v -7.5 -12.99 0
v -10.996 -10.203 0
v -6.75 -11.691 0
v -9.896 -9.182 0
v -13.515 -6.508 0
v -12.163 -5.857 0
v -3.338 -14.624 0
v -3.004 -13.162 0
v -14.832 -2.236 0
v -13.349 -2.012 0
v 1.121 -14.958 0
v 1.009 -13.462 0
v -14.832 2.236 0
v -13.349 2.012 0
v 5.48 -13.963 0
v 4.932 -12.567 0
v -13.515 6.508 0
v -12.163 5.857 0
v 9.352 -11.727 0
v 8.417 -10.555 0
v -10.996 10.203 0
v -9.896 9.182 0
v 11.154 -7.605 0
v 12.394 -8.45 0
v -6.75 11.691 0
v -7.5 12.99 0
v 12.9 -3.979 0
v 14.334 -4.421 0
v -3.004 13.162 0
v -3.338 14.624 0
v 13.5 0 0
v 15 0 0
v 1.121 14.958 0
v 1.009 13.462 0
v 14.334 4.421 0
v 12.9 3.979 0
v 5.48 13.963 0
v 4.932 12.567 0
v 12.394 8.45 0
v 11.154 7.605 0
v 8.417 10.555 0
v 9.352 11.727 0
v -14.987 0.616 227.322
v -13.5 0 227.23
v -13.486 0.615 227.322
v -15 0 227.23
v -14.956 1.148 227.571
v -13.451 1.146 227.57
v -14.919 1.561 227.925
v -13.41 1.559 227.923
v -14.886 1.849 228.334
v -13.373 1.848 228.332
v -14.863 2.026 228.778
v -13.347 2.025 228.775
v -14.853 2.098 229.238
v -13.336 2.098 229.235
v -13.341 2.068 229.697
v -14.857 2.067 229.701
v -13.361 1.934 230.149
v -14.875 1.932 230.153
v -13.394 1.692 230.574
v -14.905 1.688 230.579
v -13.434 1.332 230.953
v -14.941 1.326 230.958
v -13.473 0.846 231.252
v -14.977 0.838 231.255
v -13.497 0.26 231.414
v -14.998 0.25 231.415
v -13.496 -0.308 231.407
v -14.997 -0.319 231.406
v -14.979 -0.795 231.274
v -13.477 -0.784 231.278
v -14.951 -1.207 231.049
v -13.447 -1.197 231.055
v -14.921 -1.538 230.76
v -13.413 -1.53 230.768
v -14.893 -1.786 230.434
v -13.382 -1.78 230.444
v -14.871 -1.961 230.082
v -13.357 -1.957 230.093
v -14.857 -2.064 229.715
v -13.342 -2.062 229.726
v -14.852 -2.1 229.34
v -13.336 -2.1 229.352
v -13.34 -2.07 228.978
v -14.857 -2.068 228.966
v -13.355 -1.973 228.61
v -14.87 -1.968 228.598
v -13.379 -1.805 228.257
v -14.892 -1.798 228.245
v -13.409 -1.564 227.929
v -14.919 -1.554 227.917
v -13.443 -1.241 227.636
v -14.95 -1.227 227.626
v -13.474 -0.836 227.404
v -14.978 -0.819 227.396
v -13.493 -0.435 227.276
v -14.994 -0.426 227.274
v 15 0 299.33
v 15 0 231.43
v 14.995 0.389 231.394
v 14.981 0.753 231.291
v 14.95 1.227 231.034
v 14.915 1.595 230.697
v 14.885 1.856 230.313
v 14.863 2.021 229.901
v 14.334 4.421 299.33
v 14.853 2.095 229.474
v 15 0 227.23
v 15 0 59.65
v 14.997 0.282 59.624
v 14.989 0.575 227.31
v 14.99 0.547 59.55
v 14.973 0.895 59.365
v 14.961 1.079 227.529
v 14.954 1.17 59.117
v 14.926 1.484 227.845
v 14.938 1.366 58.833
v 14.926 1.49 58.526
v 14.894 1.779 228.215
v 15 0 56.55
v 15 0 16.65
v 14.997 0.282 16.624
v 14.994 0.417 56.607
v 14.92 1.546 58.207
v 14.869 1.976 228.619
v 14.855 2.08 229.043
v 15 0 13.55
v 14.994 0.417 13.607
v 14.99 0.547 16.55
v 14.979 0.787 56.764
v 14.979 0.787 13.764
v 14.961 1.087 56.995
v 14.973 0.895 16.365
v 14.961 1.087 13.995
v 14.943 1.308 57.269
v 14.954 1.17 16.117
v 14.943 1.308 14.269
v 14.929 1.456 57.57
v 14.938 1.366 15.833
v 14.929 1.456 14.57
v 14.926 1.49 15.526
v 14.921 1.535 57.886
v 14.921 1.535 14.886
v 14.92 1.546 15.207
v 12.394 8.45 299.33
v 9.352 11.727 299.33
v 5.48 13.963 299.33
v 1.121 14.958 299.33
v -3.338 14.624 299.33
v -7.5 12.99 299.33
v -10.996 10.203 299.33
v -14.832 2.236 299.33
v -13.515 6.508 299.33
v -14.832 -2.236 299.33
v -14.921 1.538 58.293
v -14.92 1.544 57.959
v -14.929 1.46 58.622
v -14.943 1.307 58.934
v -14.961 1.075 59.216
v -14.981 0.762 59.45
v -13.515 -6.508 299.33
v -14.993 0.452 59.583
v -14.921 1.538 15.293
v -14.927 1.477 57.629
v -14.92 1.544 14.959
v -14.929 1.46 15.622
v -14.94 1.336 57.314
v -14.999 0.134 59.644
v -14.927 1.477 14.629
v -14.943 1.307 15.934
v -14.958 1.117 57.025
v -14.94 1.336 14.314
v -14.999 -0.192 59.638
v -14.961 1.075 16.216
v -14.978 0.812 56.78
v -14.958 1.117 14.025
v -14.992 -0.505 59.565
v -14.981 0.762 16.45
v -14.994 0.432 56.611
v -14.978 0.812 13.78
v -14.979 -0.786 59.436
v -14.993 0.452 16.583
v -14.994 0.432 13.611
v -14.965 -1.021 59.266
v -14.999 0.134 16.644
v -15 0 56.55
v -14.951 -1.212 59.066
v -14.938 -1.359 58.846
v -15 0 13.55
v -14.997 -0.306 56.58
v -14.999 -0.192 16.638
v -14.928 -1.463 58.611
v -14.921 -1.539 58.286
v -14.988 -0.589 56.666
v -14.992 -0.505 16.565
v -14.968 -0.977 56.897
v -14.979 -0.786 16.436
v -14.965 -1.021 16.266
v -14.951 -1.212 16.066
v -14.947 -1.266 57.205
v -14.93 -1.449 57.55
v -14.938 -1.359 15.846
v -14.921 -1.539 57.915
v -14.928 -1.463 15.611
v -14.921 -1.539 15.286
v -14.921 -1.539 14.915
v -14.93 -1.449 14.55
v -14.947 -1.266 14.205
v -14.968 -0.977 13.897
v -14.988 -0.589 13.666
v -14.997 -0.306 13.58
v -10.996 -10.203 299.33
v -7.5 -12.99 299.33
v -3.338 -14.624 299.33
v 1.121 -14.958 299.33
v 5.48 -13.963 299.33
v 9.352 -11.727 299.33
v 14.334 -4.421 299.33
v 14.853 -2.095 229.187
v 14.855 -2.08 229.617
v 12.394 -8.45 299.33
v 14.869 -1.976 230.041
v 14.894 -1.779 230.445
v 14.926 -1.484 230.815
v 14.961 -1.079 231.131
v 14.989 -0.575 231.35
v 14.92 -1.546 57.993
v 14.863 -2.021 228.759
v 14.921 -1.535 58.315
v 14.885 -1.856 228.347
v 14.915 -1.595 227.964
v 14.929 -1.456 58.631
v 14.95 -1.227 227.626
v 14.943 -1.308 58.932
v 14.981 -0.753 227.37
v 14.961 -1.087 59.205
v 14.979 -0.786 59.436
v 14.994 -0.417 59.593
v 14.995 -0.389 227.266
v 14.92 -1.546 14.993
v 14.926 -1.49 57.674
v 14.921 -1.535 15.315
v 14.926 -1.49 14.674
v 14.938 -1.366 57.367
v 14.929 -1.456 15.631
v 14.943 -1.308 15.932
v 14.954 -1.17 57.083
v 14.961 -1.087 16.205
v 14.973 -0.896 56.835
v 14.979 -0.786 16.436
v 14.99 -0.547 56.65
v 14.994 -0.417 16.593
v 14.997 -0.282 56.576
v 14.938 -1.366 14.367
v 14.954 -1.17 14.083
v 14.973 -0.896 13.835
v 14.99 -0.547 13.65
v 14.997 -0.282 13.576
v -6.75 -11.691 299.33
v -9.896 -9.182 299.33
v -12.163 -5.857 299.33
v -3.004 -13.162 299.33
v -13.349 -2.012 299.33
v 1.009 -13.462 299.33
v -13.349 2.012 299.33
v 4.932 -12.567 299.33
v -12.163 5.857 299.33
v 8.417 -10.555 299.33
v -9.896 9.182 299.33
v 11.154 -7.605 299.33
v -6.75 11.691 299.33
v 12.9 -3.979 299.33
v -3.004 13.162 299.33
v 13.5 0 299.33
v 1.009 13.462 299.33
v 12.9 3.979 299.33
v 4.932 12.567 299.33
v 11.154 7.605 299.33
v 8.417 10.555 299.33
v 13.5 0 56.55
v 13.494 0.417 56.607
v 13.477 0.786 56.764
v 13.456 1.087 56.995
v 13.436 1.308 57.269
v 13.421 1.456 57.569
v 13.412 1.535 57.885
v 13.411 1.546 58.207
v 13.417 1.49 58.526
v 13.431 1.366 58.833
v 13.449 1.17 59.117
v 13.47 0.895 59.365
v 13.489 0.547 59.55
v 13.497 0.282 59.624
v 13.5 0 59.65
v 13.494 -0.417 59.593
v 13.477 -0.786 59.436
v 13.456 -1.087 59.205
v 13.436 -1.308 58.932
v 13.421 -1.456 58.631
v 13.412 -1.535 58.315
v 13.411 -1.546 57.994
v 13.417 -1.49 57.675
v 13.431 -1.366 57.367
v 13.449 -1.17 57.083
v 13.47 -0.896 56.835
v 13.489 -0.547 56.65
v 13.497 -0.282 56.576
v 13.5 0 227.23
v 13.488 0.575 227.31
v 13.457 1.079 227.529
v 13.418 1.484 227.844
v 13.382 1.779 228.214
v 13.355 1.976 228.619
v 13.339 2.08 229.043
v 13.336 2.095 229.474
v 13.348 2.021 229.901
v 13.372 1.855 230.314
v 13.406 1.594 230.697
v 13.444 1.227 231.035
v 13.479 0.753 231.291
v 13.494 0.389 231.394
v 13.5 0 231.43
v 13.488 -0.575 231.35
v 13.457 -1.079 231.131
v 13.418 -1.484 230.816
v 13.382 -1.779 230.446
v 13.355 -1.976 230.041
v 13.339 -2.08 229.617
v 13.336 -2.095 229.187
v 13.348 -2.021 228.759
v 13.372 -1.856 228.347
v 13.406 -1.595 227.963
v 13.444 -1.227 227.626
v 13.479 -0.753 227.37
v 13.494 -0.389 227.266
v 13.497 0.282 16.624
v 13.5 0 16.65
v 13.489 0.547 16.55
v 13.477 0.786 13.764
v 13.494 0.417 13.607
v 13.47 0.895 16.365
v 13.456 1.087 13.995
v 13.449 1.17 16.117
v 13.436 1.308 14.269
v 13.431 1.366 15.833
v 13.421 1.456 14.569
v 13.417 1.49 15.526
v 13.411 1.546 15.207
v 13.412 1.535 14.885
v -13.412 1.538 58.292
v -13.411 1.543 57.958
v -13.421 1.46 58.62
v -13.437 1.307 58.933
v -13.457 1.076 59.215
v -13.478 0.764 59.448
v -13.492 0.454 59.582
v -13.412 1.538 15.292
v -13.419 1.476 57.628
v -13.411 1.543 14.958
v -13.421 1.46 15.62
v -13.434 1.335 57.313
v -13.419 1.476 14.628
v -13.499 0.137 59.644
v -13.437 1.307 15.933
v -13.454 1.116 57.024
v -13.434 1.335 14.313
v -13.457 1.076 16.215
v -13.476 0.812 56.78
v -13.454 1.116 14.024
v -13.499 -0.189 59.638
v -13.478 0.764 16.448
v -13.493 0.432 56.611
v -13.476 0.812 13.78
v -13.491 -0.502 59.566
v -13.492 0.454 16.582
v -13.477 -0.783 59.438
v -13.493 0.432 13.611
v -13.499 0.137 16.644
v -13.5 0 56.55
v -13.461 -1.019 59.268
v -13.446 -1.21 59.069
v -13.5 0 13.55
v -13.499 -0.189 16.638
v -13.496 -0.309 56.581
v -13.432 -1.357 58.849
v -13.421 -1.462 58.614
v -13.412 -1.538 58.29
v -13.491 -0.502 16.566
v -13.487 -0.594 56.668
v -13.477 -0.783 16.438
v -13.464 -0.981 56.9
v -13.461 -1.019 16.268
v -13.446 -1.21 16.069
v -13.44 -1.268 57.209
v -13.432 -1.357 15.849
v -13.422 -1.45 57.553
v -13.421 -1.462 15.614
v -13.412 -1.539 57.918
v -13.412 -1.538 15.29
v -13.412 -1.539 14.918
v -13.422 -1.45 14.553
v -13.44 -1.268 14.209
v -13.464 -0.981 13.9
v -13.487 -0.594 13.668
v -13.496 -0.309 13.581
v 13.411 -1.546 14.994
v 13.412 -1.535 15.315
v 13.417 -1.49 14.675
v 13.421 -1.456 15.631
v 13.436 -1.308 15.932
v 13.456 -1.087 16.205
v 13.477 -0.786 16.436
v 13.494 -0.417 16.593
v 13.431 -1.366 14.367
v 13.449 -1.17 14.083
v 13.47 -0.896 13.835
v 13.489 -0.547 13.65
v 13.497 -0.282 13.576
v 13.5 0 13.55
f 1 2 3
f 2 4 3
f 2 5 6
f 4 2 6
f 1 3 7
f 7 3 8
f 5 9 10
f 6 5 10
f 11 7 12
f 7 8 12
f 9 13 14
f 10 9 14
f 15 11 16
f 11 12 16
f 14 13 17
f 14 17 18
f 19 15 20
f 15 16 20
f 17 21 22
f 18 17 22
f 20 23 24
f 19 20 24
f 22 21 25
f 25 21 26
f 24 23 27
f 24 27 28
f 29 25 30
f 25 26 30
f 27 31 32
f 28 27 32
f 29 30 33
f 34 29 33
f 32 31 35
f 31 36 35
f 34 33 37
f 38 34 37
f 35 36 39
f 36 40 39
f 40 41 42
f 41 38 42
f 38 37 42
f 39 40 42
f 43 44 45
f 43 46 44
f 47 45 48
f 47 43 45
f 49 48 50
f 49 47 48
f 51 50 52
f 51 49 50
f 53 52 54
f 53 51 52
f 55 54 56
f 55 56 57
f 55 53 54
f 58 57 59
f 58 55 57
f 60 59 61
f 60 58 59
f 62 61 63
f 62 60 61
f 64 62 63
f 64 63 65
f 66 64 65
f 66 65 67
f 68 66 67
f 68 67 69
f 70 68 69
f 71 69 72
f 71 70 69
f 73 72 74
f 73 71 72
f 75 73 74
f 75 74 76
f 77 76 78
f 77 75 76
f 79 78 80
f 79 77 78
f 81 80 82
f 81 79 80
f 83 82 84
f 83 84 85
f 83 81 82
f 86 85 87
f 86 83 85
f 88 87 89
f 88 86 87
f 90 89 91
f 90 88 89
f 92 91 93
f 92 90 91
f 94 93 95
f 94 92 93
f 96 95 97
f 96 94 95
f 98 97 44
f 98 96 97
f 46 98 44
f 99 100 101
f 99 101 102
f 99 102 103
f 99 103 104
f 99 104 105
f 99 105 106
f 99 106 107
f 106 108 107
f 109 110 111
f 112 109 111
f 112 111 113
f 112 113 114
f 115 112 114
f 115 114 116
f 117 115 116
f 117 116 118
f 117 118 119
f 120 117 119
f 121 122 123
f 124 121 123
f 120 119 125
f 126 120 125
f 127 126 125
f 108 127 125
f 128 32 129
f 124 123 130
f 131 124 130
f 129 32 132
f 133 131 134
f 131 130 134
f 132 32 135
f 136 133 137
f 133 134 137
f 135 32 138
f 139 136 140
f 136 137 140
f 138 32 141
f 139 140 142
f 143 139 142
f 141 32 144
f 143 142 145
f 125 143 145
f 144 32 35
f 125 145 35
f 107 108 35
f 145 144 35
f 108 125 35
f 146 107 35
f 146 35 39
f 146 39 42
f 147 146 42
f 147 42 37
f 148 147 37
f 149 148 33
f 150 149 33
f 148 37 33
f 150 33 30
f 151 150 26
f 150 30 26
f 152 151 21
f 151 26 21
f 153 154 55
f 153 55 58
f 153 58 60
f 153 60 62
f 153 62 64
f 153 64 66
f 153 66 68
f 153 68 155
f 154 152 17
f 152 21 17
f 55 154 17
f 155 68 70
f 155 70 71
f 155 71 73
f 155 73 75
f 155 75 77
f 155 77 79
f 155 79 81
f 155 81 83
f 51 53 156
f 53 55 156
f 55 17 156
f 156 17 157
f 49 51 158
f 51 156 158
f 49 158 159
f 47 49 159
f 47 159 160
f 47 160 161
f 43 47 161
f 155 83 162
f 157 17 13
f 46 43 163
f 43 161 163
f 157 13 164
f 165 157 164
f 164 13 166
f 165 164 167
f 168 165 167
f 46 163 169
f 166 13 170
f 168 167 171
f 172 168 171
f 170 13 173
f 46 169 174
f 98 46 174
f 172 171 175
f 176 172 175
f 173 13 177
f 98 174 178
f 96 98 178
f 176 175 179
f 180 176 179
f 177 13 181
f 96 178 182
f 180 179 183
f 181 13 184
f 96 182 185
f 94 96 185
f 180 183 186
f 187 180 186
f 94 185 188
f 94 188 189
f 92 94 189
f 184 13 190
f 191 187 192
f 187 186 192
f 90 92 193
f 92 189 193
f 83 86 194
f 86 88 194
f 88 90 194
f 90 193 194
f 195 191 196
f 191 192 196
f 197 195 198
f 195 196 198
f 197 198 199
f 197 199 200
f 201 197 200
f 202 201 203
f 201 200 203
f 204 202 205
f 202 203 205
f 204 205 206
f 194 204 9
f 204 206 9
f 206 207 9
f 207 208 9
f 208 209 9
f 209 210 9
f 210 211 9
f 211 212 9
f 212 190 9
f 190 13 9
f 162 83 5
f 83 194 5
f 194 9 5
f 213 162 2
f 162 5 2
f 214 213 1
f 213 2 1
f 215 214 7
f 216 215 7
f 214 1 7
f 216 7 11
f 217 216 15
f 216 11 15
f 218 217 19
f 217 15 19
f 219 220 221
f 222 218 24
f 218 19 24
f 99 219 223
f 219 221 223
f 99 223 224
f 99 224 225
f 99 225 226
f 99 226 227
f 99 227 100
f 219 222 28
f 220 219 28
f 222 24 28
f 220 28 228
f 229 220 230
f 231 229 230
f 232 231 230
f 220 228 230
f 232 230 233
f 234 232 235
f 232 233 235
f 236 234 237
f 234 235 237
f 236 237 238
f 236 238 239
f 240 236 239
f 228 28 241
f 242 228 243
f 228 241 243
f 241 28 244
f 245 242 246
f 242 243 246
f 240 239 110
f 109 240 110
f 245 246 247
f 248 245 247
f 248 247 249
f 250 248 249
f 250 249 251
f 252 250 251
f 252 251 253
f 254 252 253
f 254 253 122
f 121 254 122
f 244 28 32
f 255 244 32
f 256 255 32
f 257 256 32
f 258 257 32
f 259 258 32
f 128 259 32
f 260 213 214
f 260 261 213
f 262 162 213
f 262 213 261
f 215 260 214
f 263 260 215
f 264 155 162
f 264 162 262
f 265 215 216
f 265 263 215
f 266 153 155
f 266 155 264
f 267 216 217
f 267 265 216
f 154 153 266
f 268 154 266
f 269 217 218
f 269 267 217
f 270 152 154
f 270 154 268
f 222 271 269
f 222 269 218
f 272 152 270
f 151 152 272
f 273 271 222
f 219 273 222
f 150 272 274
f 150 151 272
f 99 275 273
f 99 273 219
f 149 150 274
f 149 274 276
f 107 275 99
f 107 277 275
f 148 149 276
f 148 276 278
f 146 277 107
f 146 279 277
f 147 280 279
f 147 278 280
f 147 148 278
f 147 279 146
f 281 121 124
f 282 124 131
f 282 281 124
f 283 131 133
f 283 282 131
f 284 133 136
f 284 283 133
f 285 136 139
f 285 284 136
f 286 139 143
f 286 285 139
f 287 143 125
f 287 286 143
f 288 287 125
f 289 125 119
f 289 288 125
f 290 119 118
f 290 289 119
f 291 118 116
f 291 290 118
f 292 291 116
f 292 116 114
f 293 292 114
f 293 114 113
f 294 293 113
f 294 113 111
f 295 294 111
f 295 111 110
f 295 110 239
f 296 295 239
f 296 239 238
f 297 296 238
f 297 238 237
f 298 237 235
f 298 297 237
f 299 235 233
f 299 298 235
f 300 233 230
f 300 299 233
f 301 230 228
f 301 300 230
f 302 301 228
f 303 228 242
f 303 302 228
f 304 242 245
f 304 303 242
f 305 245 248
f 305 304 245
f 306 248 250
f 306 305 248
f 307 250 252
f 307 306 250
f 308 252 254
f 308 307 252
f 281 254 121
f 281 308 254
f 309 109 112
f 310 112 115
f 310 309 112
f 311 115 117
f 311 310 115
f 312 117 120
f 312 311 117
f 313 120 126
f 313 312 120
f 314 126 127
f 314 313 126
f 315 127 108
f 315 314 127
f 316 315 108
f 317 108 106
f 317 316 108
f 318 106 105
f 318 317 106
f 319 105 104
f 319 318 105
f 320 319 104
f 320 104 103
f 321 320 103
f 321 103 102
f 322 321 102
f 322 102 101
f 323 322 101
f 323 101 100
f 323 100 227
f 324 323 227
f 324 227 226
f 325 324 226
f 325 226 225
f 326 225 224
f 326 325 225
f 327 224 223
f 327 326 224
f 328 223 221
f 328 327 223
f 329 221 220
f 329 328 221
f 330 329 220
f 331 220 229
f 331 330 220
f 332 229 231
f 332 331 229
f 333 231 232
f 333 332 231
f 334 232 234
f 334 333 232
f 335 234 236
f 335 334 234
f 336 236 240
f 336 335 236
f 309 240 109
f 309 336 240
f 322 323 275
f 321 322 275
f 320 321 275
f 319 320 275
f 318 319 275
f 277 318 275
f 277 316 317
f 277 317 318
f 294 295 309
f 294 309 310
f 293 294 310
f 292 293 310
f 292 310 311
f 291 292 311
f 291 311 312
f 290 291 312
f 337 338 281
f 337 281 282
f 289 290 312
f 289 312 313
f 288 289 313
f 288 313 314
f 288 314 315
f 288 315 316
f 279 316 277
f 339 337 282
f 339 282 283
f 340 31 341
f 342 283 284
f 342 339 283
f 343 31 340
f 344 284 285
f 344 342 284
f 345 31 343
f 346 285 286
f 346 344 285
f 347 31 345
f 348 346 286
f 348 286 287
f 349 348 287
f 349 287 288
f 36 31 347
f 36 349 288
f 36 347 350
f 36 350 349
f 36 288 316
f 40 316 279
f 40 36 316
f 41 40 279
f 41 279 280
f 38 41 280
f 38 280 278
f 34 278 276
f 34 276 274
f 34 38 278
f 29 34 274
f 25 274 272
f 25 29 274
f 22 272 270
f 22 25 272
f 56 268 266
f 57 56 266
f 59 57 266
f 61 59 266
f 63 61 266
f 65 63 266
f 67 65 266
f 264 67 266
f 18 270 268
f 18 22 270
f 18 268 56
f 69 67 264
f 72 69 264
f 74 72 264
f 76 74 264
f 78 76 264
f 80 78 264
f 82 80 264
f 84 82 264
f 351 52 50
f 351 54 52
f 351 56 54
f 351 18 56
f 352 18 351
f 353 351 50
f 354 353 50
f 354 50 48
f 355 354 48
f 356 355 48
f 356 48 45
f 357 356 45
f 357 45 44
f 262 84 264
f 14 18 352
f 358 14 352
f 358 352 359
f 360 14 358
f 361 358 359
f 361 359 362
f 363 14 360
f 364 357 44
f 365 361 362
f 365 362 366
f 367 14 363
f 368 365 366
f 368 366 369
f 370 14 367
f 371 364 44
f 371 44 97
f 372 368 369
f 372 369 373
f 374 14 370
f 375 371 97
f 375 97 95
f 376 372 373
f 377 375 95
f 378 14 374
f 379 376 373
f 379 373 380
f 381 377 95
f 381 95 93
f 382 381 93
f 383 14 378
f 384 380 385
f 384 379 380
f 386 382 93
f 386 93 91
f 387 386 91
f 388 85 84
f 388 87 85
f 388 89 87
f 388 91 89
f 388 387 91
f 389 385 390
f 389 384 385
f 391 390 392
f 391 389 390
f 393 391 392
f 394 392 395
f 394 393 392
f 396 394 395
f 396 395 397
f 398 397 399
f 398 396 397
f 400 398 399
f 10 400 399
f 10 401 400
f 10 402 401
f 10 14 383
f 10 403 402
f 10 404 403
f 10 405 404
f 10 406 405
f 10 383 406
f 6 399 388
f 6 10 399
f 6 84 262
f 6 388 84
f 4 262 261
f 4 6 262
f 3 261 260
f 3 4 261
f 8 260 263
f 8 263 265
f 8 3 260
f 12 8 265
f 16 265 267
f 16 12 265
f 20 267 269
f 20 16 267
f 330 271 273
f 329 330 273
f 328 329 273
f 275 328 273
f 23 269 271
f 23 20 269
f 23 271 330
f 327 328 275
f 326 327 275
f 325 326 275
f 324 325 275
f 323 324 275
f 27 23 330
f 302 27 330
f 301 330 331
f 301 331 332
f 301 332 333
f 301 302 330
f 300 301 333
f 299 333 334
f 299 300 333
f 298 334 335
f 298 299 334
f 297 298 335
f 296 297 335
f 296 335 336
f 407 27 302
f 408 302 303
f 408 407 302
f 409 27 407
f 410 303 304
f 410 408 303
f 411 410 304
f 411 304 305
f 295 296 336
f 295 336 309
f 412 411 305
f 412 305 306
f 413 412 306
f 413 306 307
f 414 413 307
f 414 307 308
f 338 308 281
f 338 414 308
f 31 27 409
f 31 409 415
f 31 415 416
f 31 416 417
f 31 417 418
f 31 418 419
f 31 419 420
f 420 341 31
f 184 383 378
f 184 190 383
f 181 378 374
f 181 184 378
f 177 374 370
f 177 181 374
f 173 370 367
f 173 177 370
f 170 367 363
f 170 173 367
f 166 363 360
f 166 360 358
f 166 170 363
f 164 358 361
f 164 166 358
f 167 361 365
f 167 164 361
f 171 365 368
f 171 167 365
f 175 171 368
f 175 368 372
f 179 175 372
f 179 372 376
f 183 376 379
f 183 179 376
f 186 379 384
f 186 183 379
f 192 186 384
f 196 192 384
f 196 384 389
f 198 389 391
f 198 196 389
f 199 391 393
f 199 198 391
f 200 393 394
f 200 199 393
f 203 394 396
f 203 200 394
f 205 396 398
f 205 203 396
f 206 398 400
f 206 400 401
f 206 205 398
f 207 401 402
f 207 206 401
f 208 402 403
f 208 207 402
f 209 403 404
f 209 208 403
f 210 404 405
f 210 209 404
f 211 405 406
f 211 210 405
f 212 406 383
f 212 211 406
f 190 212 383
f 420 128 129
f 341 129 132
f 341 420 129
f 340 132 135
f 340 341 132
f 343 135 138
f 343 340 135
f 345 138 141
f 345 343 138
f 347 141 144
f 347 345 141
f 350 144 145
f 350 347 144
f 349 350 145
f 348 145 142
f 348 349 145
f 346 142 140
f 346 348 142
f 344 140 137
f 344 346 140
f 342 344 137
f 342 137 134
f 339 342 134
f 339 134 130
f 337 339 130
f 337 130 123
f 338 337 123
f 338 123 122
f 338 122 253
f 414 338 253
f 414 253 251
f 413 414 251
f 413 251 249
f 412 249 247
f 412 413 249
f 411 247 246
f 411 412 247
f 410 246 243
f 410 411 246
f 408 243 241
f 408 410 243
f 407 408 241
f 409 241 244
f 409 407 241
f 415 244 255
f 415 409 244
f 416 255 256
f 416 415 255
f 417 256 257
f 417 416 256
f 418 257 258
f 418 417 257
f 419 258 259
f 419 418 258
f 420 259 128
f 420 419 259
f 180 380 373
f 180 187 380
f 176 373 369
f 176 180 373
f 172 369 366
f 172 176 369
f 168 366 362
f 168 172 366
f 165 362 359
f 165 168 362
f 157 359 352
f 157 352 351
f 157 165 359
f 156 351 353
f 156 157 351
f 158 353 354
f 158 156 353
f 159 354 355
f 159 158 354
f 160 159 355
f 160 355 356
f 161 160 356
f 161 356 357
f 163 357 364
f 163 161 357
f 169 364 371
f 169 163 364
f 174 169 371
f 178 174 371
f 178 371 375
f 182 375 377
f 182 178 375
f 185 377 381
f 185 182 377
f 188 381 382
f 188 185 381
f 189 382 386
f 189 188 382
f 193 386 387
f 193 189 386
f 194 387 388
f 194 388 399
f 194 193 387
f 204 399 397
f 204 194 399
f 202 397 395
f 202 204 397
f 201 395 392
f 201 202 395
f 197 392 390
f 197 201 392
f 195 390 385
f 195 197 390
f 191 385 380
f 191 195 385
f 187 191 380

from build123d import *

# Parameters (mm, degrees)
SKETCH_1_R               = 15
SKETCH_1_R_2             = 13.5
EXTRUDE_1_DEPTH          = 299.33
CUT_EXTRUDE_1_DEPTH      = 301.080737302
CUT_EXTRUDE_1_DEPTH_BACK = 301.080737302
SKETCH_2_R               = 1.55
CUT_EXTRUDE_2_DEPTH      = 301.080737413
CUT_EXTRUDE_2_DEPTH_BACK = 301.080737413
SKETCH_3_R               = 2.1


with BuildPart() as part:
    # 草图1 → 凸台-拉伸1 (new body)
    with BuildSketch(Plane.XY):
        Circle(SKETCH_1_R)
        Circle(SKETCH_1_R_2, mode=Mode.SUBTRACT)
    extrude(amount=EXTRUDE_1_DEPTH)

    # 草图2 → 切除-拉伸1 (cut, two sides: drawn at the far end of the back side and taken through both)
    with BuildSketch(Plane(origin=(0, 0, 0), x_dir=(0, 0, -1), z_dir=(1, 0, 0)).offset(-CUT_EXTRUDE_1_DEPTH_BACK)):
        with Locations((-15.1, 0)):
            Circle(SKETCH_2_R)
        with Locations((-58.1, 0)):
            Circle(SKETCH_2_R)
    extrude(amount=CUT_EXTRUDE_1_DEPTH + CUT_EXTRUDE_1_DEPTH_BACK, mode=Mode.SUBTRACT)

    # 草图3 → 切除-拉伸2 (cut, two sides: drawn at the far end of the back side and taken through both)
    with BuildSketch(Plane(origin=(0, 0, 0), x_dir=(0, 0, -1), z_dir=(1, 0, 0)).offset(-CUT_EXTRUDE_2_DEPTH_BACK)):
        with Locations((-229.33, 0)):
            Circle(SKETCH_3_R)
    extrude(amount=CUT_EXTRUDE_2_DEPTH + CUT_EXTRUDE_2_DEPTH_BACK, mode=Mode.SUBTRACT)


solid = part.part
